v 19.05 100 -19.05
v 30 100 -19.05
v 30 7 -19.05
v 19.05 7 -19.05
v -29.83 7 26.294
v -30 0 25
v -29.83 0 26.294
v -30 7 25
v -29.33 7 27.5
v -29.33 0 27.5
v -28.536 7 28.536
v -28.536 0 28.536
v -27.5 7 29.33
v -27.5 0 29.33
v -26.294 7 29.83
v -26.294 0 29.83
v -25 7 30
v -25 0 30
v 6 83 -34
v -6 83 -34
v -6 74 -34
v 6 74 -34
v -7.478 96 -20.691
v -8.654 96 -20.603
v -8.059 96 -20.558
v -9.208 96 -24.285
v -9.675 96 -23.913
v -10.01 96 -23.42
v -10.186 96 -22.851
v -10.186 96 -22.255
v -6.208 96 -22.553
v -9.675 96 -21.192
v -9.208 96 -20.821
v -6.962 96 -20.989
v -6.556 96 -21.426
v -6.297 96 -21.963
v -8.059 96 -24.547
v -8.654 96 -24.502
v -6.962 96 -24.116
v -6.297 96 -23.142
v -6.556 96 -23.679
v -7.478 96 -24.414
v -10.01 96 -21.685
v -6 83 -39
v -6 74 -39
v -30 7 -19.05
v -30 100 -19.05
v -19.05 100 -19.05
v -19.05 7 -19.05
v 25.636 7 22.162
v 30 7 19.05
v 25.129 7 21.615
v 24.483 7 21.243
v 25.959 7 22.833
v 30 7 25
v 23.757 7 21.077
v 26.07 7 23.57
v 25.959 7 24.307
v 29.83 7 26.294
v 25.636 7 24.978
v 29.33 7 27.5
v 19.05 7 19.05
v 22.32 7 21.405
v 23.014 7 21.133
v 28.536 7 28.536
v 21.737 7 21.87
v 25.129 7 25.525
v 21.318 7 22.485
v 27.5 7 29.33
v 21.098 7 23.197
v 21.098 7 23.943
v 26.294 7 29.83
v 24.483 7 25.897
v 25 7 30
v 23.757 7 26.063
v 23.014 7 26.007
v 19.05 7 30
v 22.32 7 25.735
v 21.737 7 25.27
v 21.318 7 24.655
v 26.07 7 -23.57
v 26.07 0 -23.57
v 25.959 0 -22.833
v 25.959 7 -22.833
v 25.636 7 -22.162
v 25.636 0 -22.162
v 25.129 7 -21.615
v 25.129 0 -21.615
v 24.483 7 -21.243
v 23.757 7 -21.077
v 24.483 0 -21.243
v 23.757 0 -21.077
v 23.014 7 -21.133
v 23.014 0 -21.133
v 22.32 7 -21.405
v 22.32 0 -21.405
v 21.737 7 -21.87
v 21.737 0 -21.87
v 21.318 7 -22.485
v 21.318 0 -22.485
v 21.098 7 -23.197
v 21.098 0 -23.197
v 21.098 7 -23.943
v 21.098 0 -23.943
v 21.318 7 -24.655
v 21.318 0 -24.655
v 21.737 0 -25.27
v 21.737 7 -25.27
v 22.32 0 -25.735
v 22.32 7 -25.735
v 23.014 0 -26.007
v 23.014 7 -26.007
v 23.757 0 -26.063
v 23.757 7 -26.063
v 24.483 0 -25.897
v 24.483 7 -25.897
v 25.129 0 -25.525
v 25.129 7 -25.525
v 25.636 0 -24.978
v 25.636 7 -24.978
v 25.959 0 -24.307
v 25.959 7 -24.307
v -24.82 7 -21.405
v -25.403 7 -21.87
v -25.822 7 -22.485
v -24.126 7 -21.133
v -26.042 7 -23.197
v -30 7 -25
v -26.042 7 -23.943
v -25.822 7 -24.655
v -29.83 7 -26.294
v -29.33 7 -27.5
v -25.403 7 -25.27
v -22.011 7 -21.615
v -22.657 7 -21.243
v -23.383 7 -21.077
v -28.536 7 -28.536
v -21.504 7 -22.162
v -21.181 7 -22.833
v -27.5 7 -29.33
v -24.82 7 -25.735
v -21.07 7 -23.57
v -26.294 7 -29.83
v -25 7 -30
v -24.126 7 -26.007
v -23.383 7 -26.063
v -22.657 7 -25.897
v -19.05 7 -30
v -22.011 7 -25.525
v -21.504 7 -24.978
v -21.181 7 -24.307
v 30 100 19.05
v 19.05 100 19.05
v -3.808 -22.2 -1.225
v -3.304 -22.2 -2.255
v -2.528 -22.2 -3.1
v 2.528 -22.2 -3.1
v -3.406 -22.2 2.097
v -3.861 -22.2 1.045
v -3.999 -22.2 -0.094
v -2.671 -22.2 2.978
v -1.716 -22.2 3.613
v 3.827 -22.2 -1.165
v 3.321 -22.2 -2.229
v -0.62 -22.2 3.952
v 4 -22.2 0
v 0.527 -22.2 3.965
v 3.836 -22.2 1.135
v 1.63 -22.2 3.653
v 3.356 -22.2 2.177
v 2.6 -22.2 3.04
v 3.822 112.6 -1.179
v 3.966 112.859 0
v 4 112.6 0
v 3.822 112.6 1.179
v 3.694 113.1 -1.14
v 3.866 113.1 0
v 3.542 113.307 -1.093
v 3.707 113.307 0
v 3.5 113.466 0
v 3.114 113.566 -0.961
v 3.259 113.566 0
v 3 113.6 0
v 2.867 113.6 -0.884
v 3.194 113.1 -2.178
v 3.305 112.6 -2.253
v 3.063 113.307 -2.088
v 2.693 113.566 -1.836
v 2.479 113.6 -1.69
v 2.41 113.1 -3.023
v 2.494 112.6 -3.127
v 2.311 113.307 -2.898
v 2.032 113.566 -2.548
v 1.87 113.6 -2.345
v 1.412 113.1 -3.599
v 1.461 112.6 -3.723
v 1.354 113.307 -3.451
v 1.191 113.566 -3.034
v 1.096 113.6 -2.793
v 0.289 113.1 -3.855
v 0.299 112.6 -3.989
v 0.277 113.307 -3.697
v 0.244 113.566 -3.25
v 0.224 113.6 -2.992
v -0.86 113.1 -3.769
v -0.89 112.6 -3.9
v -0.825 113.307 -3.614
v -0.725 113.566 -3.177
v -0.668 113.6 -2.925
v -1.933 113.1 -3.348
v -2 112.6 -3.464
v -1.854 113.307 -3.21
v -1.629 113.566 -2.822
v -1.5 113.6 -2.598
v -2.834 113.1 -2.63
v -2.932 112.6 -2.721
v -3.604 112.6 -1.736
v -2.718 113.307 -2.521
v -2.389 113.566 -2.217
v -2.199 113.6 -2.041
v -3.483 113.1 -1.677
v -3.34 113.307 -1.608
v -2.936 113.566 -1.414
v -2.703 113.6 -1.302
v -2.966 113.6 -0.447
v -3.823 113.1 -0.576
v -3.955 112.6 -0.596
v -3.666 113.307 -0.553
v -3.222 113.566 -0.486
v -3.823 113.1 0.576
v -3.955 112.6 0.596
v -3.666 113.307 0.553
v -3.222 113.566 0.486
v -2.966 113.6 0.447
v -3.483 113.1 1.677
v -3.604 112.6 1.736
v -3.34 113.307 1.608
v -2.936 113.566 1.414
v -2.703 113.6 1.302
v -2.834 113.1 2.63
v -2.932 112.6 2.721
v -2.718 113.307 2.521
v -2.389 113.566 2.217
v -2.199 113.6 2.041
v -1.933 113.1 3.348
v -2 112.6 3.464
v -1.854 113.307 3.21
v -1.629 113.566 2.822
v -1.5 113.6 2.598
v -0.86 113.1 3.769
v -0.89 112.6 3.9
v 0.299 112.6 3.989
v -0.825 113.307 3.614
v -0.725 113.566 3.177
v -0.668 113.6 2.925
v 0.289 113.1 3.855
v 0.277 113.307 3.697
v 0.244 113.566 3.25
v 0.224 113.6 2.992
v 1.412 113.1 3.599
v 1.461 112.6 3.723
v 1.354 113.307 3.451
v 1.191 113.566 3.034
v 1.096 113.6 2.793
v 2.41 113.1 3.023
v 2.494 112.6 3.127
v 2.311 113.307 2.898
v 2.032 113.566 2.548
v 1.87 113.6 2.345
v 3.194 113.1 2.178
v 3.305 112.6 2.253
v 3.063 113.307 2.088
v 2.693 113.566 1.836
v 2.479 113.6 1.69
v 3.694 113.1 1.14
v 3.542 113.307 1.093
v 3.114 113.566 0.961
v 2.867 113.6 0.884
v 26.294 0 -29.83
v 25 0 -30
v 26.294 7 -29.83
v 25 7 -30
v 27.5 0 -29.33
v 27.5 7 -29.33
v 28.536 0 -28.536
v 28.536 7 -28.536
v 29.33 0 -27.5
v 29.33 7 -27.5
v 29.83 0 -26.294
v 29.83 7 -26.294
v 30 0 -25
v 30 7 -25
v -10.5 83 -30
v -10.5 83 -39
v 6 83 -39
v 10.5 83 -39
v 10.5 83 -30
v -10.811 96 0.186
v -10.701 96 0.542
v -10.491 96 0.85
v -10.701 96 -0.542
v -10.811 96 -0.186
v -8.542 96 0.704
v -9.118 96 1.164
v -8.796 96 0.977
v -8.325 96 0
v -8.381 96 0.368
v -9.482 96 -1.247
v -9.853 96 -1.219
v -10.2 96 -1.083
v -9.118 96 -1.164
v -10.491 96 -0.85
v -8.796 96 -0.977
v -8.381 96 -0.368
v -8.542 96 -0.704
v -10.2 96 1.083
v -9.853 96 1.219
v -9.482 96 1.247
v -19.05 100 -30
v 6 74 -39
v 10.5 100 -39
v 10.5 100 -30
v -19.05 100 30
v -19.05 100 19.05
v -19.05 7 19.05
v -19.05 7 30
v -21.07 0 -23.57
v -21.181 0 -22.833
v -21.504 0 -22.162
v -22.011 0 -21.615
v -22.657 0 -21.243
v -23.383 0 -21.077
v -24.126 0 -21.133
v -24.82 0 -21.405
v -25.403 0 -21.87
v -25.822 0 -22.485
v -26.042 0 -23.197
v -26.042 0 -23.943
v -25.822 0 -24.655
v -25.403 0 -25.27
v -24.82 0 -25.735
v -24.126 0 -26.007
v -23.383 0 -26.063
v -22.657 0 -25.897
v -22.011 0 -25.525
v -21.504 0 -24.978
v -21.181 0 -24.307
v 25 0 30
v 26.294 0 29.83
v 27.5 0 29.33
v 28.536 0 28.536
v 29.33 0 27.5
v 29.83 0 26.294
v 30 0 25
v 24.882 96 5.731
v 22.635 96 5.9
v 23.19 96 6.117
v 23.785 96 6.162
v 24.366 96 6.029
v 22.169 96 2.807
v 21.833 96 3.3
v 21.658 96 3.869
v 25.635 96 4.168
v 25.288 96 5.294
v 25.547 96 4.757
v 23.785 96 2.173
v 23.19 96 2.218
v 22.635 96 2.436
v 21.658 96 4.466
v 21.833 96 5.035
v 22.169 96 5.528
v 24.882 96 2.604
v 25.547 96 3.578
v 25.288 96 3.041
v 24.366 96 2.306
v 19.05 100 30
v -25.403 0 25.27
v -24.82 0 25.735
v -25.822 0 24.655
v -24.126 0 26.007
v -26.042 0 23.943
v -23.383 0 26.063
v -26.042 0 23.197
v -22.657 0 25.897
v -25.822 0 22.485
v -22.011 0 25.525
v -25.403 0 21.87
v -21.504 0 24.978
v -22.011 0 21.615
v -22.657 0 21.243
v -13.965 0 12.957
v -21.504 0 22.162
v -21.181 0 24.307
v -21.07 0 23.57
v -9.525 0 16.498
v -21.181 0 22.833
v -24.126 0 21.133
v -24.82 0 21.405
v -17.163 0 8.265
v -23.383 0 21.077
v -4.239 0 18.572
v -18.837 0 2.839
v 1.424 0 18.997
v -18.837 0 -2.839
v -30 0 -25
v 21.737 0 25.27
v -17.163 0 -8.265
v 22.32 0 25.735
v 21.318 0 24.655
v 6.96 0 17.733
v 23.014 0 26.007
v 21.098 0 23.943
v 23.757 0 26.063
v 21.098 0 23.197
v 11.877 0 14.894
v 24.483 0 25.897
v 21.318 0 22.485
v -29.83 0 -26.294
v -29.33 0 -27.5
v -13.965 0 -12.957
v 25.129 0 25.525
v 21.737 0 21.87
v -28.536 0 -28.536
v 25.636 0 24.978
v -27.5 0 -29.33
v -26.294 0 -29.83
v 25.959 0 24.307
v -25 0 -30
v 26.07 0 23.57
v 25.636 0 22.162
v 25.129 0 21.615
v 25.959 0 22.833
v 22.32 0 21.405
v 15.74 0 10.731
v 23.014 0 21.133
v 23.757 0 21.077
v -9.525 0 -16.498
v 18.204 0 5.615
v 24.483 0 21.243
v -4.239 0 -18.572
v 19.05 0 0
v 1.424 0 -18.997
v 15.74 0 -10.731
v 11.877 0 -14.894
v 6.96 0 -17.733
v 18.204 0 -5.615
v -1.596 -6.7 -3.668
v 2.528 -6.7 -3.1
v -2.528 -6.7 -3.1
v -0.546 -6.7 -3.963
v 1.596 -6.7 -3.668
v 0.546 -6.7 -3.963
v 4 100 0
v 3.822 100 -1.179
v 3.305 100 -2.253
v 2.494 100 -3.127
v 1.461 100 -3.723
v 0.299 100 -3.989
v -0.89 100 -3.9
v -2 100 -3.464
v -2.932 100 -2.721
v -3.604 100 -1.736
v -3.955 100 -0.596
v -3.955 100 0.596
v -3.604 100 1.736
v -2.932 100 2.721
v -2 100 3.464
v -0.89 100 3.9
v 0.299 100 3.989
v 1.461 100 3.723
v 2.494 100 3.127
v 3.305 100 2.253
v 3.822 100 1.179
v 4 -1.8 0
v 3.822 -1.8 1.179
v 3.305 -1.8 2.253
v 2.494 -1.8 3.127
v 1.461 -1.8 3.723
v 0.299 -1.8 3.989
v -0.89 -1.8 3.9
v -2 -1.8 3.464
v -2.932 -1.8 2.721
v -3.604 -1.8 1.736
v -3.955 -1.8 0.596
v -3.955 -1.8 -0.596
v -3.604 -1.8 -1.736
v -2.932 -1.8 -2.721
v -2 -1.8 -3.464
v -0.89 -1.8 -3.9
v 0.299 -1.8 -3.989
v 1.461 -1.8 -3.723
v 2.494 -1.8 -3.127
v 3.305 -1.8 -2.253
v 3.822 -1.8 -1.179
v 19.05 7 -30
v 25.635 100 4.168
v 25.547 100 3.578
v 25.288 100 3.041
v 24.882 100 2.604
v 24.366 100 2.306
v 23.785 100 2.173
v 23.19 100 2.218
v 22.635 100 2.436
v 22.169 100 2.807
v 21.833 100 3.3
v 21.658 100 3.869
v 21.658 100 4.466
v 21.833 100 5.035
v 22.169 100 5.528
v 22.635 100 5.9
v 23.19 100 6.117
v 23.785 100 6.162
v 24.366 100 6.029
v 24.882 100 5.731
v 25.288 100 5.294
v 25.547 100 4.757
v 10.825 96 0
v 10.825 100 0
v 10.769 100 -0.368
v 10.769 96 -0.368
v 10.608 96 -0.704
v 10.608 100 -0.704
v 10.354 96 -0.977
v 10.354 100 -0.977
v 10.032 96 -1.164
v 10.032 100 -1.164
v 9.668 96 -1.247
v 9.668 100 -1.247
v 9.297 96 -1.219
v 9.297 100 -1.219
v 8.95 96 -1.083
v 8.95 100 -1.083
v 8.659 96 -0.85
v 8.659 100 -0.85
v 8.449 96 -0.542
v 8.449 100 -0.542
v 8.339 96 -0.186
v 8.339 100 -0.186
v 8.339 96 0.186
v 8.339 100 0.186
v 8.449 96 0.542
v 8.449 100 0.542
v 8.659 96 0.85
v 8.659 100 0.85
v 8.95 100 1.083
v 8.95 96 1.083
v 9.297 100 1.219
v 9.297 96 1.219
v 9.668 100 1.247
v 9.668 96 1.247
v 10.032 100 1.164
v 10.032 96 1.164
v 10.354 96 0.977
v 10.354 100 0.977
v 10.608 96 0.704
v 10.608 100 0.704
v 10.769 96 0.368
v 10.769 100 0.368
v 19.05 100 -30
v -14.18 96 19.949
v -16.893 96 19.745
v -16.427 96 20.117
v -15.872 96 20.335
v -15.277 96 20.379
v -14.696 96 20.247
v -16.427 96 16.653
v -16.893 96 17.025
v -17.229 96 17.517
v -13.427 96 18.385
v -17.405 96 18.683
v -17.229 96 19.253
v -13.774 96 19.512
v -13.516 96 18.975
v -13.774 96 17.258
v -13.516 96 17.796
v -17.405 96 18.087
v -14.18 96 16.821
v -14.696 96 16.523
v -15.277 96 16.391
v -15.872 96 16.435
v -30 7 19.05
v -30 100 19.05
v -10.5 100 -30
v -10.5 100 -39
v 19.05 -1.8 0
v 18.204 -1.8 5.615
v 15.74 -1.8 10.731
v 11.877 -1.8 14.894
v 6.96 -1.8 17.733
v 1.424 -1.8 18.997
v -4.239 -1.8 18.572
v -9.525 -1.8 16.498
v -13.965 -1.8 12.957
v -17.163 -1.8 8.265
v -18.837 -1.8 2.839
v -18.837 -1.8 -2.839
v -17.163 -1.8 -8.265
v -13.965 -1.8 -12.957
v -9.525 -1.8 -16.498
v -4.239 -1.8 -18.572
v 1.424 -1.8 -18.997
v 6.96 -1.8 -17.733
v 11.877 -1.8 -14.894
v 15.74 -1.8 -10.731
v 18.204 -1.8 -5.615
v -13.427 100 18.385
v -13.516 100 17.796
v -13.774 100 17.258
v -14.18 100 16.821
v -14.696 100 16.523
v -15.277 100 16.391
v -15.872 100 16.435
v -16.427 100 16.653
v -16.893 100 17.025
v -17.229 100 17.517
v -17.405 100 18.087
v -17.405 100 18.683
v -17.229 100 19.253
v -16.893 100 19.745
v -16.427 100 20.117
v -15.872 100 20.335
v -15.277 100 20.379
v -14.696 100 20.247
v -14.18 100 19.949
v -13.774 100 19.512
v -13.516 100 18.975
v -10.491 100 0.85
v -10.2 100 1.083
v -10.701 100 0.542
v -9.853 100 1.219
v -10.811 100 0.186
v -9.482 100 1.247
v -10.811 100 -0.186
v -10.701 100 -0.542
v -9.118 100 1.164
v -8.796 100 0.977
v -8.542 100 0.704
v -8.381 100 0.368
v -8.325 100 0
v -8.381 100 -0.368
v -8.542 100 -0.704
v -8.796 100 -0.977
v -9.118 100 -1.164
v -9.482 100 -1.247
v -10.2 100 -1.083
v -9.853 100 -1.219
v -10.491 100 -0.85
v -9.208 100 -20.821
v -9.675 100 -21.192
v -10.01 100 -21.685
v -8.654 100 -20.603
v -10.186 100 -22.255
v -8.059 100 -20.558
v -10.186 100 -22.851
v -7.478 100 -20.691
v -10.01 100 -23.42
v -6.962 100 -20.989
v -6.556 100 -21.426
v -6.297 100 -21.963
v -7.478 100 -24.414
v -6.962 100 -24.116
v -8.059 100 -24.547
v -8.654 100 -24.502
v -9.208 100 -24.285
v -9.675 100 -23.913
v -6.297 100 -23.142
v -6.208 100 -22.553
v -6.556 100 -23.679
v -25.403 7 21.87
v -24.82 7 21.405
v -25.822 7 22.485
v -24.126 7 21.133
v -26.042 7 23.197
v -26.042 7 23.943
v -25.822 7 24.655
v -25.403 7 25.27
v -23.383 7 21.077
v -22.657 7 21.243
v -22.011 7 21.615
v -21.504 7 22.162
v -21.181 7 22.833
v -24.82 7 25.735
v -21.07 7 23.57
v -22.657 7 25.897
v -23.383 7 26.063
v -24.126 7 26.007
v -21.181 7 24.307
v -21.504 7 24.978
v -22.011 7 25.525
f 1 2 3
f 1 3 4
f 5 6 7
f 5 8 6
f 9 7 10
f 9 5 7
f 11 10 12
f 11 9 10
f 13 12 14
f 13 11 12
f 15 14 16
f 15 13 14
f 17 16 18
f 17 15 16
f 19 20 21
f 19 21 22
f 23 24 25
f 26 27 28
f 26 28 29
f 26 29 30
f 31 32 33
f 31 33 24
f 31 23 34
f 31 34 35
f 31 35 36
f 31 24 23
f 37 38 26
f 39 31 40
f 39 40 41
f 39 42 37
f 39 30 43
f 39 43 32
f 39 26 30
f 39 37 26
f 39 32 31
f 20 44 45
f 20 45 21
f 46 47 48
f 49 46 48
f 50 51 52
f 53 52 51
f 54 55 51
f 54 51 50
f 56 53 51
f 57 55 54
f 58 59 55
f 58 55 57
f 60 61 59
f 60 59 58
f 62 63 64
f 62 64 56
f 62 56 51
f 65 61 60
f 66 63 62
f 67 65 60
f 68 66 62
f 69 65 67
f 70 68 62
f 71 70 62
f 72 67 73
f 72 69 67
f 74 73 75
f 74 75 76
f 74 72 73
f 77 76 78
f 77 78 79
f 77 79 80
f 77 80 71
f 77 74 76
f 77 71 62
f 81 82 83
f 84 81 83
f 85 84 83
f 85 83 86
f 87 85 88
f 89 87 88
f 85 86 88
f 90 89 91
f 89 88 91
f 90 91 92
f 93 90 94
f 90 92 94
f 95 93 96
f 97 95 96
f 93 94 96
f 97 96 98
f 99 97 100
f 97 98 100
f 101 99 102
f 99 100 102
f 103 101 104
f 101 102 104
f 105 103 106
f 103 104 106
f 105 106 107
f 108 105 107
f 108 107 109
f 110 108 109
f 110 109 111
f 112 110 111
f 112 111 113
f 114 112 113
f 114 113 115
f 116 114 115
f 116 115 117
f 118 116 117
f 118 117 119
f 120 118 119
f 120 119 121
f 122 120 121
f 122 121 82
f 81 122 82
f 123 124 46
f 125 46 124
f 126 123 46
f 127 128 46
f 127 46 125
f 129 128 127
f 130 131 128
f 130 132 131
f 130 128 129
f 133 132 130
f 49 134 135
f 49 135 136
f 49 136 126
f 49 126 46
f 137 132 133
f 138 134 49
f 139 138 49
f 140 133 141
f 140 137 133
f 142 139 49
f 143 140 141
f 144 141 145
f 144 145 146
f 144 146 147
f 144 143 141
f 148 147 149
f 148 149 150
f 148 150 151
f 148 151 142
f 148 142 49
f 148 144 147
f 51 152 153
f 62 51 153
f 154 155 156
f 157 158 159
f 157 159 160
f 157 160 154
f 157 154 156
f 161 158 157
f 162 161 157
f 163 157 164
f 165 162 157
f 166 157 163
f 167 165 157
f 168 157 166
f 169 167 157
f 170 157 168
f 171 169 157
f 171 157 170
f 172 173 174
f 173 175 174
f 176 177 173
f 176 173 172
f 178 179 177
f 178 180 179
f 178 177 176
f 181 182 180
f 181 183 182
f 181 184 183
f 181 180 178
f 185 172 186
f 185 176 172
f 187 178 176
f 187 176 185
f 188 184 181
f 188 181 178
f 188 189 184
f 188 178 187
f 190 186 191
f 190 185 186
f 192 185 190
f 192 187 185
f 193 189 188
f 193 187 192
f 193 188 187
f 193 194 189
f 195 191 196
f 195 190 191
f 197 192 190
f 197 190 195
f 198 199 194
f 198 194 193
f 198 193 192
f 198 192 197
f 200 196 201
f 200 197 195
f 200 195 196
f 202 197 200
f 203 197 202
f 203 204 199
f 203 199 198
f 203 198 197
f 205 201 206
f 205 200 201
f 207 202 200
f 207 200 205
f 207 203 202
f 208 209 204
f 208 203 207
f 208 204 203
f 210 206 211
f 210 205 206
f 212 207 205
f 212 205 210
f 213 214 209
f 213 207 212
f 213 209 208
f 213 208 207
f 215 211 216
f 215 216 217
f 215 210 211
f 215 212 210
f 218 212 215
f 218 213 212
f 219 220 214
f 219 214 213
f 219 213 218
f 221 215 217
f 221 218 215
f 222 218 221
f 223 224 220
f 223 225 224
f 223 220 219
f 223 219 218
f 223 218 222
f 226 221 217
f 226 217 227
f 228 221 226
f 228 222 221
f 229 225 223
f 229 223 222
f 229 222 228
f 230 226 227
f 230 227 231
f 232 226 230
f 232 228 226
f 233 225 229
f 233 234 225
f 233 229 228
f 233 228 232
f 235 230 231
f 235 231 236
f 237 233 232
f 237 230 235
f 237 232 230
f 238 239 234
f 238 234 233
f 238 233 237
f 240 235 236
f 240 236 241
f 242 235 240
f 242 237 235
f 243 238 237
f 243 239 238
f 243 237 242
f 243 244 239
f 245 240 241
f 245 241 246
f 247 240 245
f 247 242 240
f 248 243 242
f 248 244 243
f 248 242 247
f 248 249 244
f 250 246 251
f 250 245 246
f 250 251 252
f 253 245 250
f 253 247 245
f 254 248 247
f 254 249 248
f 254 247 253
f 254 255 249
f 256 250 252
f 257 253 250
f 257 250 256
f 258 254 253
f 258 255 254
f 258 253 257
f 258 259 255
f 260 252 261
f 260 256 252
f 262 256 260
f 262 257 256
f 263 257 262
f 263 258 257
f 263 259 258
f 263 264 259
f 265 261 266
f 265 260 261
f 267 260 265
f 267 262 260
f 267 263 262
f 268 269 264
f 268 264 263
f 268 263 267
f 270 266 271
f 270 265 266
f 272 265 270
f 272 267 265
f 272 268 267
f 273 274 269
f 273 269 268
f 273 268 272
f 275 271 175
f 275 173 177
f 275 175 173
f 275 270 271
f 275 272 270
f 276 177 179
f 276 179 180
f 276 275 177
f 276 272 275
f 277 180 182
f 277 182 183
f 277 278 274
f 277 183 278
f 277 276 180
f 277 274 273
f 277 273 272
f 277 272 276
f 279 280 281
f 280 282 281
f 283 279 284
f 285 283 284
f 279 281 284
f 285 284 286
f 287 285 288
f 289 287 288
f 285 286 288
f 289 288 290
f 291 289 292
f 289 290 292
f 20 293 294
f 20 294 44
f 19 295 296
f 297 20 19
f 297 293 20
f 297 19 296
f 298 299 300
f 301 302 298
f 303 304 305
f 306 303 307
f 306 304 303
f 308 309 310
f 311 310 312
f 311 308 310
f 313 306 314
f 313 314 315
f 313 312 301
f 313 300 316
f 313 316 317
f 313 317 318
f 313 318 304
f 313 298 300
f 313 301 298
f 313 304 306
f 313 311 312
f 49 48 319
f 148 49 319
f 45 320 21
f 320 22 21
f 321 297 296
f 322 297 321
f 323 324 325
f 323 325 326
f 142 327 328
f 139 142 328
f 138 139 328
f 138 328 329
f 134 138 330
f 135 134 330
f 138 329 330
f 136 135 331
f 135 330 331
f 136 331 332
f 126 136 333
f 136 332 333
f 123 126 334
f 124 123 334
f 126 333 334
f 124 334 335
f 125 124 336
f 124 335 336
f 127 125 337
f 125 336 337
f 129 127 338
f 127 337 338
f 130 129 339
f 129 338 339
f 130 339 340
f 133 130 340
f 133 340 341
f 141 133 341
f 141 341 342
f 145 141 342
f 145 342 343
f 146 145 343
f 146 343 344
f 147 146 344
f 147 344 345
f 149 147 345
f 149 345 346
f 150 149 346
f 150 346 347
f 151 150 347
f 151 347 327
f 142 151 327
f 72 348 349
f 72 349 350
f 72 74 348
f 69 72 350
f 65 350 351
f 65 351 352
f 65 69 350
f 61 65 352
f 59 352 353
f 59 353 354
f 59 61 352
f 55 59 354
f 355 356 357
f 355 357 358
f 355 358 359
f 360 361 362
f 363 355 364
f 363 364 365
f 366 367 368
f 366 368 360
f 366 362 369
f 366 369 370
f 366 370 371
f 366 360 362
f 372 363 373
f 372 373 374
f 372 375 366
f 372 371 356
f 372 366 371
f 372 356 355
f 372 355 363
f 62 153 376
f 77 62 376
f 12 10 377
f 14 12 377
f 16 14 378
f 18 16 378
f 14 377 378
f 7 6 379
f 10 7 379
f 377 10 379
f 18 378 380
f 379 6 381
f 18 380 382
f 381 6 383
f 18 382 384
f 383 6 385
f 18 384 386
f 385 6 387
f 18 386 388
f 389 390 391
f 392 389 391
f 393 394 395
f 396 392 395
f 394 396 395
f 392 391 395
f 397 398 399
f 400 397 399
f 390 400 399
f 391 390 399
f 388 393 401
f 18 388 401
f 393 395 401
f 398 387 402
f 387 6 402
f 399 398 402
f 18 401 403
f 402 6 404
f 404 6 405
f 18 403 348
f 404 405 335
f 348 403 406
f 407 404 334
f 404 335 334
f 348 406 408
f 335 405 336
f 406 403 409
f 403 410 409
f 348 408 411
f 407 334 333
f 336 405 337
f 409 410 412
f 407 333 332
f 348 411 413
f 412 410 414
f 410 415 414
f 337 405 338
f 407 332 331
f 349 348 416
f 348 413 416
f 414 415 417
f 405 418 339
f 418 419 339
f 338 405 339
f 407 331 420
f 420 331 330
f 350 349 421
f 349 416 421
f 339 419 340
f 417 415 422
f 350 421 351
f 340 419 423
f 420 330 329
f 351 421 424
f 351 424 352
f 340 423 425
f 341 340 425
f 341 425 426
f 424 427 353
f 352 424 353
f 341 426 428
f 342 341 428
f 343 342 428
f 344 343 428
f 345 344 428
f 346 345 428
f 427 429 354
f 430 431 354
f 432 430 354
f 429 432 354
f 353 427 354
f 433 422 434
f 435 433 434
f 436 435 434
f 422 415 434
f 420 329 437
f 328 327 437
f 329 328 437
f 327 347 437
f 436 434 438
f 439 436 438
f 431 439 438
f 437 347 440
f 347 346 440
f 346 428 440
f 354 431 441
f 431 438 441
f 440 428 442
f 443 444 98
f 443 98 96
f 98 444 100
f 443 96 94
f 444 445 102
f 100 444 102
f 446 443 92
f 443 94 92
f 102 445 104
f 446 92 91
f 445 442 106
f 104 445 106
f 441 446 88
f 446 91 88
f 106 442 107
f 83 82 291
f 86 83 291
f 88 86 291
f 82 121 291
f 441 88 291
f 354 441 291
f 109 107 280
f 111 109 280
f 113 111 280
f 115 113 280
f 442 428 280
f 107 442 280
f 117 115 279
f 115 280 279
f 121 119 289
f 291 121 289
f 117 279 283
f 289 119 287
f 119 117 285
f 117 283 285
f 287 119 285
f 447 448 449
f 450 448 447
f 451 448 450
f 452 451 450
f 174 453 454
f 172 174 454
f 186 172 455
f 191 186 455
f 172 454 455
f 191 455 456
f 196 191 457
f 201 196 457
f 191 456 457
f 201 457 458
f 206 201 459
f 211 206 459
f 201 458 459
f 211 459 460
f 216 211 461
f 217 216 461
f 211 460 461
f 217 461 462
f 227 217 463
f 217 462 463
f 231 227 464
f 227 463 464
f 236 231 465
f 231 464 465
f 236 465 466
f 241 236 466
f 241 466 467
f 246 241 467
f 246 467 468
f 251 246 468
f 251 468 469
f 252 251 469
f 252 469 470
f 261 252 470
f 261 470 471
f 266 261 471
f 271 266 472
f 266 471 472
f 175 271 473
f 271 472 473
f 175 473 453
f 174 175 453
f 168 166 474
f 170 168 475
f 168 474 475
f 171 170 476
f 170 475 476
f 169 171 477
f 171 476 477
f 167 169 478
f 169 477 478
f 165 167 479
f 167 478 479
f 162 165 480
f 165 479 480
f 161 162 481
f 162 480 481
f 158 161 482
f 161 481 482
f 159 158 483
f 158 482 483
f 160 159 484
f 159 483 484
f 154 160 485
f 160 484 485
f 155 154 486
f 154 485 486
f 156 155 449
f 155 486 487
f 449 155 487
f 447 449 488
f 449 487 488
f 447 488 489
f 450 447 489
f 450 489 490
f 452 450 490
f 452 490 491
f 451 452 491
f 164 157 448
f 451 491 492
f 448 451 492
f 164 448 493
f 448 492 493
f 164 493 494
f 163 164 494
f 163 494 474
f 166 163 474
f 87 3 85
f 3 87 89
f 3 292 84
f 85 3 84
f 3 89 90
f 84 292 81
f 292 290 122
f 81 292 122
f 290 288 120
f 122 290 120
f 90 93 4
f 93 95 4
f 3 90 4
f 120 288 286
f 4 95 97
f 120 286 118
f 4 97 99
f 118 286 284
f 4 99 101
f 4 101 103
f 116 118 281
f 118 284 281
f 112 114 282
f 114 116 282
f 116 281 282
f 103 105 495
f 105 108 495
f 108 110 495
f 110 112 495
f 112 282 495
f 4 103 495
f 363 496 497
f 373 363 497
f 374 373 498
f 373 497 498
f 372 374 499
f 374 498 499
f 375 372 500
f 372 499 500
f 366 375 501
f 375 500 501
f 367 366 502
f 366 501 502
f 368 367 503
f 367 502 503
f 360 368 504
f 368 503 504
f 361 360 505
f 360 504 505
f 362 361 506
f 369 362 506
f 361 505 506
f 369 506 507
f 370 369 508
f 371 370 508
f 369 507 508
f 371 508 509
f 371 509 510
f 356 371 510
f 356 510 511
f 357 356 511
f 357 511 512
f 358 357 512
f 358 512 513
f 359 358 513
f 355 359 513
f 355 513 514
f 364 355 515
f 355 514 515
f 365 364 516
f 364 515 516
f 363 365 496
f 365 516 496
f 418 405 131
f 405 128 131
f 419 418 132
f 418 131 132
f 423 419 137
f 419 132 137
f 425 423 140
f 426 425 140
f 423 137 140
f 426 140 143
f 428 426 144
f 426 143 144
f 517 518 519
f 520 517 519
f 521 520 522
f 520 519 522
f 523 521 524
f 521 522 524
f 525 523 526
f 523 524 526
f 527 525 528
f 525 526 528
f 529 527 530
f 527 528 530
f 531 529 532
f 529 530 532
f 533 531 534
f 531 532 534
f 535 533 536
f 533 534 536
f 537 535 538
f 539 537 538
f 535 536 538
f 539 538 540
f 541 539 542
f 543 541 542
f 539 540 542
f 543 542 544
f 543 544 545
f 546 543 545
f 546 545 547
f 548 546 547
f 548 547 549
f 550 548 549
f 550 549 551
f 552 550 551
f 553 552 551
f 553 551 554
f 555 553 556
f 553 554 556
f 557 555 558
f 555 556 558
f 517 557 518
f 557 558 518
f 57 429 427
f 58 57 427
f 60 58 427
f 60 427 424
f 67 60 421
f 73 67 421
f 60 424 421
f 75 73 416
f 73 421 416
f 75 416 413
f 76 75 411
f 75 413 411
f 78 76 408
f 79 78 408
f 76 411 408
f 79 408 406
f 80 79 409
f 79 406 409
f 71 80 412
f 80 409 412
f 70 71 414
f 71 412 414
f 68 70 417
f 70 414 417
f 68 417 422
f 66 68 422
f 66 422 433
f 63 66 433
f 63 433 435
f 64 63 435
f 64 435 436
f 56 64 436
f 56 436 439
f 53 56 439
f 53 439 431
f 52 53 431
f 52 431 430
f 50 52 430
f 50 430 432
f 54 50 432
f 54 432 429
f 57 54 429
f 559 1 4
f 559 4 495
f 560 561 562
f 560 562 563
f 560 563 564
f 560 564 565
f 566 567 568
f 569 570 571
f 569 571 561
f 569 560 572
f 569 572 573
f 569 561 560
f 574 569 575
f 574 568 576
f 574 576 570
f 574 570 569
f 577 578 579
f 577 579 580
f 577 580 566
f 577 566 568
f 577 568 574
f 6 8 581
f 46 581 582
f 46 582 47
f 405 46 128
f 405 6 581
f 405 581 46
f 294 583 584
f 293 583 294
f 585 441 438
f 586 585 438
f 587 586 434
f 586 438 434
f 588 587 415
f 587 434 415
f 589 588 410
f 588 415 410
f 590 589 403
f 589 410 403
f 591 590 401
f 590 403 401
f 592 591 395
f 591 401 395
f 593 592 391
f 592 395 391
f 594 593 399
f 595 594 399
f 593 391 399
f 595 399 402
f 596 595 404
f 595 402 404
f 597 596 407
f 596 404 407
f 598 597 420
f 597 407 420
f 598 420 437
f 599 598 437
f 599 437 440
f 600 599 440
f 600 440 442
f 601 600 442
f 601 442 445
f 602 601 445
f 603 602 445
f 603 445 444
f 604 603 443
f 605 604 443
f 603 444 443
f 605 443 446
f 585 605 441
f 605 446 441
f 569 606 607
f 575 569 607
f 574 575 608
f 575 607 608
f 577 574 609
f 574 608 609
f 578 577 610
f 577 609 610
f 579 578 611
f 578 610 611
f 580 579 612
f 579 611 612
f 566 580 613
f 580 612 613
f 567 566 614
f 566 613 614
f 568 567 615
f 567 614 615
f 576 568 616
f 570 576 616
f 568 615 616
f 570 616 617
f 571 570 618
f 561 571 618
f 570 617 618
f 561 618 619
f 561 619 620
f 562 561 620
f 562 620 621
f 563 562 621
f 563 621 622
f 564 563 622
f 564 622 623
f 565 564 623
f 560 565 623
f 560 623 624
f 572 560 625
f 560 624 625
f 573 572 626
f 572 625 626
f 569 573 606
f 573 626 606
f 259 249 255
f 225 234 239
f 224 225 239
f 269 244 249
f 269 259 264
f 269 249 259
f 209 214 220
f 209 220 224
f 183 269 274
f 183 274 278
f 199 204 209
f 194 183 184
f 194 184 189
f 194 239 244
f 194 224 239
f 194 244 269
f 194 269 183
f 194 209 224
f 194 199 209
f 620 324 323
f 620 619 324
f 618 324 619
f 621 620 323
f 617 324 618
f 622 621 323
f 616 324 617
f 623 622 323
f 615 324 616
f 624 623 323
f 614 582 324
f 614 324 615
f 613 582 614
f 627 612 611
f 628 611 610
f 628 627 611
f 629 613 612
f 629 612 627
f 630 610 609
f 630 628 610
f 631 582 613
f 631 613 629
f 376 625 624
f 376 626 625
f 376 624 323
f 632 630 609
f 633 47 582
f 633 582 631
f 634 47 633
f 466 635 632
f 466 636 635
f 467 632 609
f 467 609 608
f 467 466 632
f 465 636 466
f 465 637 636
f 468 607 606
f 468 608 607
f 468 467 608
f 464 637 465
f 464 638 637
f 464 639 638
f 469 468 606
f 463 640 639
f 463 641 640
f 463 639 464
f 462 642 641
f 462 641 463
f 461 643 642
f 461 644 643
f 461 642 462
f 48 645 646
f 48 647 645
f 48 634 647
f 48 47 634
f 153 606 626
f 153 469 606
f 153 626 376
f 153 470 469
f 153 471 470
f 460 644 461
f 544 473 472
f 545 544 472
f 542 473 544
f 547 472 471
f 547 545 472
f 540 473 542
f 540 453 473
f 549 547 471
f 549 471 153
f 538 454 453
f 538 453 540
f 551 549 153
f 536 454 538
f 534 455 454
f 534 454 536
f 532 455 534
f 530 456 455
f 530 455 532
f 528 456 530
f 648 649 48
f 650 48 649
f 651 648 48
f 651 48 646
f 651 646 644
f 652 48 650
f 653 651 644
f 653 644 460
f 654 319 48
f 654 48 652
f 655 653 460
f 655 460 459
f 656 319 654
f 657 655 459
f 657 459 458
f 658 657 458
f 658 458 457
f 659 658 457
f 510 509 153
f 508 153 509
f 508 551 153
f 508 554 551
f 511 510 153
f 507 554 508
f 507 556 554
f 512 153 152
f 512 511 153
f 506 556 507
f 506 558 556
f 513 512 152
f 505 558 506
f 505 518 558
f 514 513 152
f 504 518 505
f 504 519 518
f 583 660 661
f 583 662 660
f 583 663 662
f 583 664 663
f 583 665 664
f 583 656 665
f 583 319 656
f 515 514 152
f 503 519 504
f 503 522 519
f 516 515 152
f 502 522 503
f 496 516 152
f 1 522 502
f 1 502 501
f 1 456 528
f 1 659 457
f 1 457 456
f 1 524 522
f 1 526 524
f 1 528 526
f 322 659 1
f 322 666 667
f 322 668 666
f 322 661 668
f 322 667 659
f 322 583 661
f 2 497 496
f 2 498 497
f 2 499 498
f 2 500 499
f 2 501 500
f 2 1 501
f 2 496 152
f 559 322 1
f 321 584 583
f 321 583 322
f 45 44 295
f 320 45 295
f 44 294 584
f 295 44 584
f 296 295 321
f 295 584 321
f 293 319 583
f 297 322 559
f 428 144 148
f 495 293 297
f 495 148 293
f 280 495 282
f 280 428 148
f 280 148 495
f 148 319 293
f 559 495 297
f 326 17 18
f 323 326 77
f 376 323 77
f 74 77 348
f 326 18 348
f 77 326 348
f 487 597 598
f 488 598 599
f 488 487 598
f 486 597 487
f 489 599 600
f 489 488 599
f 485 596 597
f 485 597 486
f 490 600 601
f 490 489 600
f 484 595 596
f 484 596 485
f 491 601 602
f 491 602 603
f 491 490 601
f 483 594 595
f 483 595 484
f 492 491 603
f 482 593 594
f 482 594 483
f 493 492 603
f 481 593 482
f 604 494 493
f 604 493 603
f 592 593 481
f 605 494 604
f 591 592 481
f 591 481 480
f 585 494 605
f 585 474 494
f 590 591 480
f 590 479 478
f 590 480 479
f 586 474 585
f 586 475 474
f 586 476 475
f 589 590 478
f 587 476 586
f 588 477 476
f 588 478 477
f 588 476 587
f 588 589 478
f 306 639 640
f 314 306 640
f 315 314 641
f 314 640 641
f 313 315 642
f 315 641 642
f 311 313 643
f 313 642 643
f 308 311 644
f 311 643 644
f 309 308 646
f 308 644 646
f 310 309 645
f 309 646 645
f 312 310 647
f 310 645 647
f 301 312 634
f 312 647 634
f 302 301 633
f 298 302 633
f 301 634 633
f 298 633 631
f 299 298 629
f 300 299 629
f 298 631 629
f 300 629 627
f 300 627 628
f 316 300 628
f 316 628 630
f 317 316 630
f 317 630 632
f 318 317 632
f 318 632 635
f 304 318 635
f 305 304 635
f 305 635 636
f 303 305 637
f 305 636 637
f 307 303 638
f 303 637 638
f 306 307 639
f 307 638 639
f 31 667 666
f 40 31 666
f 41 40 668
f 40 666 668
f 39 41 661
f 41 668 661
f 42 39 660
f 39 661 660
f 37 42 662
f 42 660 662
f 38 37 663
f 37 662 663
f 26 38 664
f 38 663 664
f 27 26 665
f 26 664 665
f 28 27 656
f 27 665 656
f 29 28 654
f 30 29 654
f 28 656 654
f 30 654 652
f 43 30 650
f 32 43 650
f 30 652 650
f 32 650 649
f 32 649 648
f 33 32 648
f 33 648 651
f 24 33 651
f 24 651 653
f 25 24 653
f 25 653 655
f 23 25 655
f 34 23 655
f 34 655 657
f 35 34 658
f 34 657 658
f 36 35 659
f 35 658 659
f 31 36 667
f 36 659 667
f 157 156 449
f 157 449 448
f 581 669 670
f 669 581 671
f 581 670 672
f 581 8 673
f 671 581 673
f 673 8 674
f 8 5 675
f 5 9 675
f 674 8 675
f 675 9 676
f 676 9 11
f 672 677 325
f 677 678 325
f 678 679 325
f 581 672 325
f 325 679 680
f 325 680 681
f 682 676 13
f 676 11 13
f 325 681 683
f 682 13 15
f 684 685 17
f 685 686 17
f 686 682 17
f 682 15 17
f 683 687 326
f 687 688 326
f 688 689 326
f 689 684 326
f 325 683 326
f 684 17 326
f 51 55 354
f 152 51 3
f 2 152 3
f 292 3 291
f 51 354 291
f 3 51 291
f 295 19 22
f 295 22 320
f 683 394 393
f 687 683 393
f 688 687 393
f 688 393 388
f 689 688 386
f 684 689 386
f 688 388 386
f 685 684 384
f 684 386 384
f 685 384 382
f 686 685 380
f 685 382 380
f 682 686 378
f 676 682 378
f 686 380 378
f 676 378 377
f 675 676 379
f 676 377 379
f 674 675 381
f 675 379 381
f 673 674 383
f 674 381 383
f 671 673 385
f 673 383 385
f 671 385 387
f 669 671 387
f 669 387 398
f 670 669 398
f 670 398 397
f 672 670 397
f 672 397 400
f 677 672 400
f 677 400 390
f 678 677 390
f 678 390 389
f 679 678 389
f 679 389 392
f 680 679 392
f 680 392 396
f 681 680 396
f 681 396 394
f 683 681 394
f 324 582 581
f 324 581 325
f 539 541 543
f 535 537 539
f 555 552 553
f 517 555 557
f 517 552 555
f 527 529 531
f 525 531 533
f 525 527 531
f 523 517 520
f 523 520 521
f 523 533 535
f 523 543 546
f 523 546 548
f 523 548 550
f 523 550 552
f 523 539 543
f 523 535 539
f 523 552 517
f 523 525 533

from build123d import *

# Parameters (mm, degrees)
SKETCH1_W               = 60
SKETCH1_H               = 60
BOSS_EXTRUDE1_DEPTH     = 100
SKETCH2_W               = 10.95
SKETCH2_H               = 10.95
CUT_EXTRUDE1_DEPTH      = 93
MIRROR2_COPY_1_SKETCH_W = 10.95
MIRROR2_COPY_1_SKETCH_H = 10.95
MIRROR2_COPY_1_DEPTH    = 93
SKETCH5_R               = 2.5
CUT_EXTRUDE2_DEPTH      = 93
SKETCH7_R               = 19.05
BOSS_EXTRUDE4_DEPTH     = 1.8
SKETCH8_R               = 4
BOSS_EXTRUDE5_DEPTH     = 20.4
FILLET2_R               = 5
SKETCH15_R              = 4
BOSS_EXTRUDE6_DEPTH     = 13.6
FILLET4_R               = 1
CUT_EXTRUDE4_DEPTH      = 15.5
BOSS_EXTRUDE7_DEPTH     = 9
BOSS_EXTRUDE8_DEPTH     = 9
SKETCH22_R              = 1.25
SKETCH22_R_2            = 2
CUT_EXTRUDE7_DEPTH      = 4


with BuildPart() as part:
    # Sketch1 → Boss-Extrude1 (new body)
    with BuildSketch(Plane(origin=(0, 0, 0), x_dir=(1, 0, 0), z_dir=(0, 1, 0))):
        Rectangle(SKETCH1_W, SKETCH1_H)
    extrude(amount=BOSS_EXTRUDE1_DEPTH)

    # Sketch2 → Cut-Extrude1 (cut)
    with BuildSketch(Plane(origin=(0, 100, 0), x_dir=(1, 0, 0), z_dir=(0, 1, 0))):
        with Locations((-24.525, 24.525)):
            Rectangle(SKETCH2_W, SKETCH2_H)
    cut_extrude1 = extrude(amount=-CUT_EXTRUDE1_DEPTH, mode=Mode.SUBTRACT)

    # Mirror1: Cut-Extrude1 across plane
    add(cut_extrude1.mirror(Plane(origin=(0, 0, 0), x_dir=(0, 0, 1), z_dir=(1, 0, 0))), mode=Mode.SUBTRACT)

    # Mirror2: Cut-Extrude1 across plane
    add(cut_extrude1.mirror(Plane.XY), mode=Mode.SUBTRACT)

    # Mirror2 copy 1 sketch → Mirror2 copy 1 (cut)
    with BuildSketch(Plane(origin=(0, 100, 0), x_dir=(-1, 0, 0), z_dir=(0, 1, 0))):
        with Locations((-24.525, 24.525)):
            Rectangle(MIRROR2_COPY_1_SKETCH_W, MIRROR2_COPY_1_SKETCH_H)
    extrude(amount=-MIRROR2_COPY_1_DEPTH, mode=Mode.SUBTRACT)

    # Sketch5 → Cut-Extrude2 (cut)
    with BuildSketch(Plane.XZ):
        with Locations((-23.57, -23.57)):
            Circle(SKETCH5_R)
        with Locations((23.57, -23.57)):
            Circle(SKETCH5_R)
        with Locations((23.57, 23.57)):
            Circle(SKETCH5_R)
        with Locations((-23.57, 23.57)):
            Circle(SKETCH5_R)
    extrude(amount=-CUT_EXTRUDE2_DEPTH, mode=Mode.SUBTRACT)

    # Sketch7 → Boss-Extrude4 (add)
    with BuildSketch(Plane.XZ):
        Circle(SKETCH7_R)
    extrude(amount=BOSS_EXTRUDE4_DEPTH)

    # Sketch8 → Boss-Extrude5 (add)
    with BuildSketch(Plane.XZ.offset(1.8)):
        Circle(SKETCH8_R)
    extrude(amount=BOSS_EXTRUDE5_DEPTH)

    # Fillet2
    fillet2_edges = [part.edges().sort_by_distance(p)[0] for p in [
        (-30, 3.5, -30),
        (30, 3.5, -30),
        (30, 3.5, 30),
        (-30, 3.5, 30),
    ]]
    fillet(fillet2_edges, radius=FILLET2_R)

    # Sketch15 → Boss-Extrude6 (add)
    with BuildSketch(Plane(origin=(0, 100, 0), x_dir=(1, 0, 0), z_dir=(0, 1, 0))):
        Circle(SKETCH15_R)
    extrude(amount=BOSS_EXTRUDE6_DEPTH)

    # Fillet4
    fillet4_edges = [part.edges().sort_by_distance(p)[0] for p in [
        (-4, 113.6, 0),
    ]]
    fillet(fillet4_edges, radius=FILLET4_R)

    # Sketch17 → Cut-Extrude4 (cut)
    with BuildSketch(Plane.XZ.offset(22.2)):
        with BuildLine():
            Line((-2.552821159, -3.1), (2.552821159, -3.1))
            ThreePointArc((2.552821159, -3.1), (0, -4.015830658), (-2.552821159, -3.1))
        make_face()
    extrude(amount=-CUT_EXTRUDE4_DEPTH, mode=Mode.SUBTRACT)

    # Sketch20 → Boss-Extrude7 (add)
    with BuildSketch(Plane(origin=(0, 0, -30), x_dir=(-1, 0, 0), z_dir=(0, 0, -1))):
        Polygon((0, 100), (10.5, 100), (10.5, 83), (-10.5, 83), (-10.5, 100), align=None)
    extrude(amount=BOSS_EXTRUDE7_DEPTH)

    # Sketch21 → Boss-Extrude8 (add)
    with BuildSketch(Plane.XZ.offset(-83)):
        Polygon((0, -39), (-6, -39), (-6, -34), (6, -34), (6, -39), align=None)
    extrude(amount=BOSS_EXTRUDE8_DEPTH)

    # Sketch22 → Cut-Extrude7 (cut)
    with BuildSketch(Plane(origin=(0, 100, 0), x_dir=(1, 0, 0), z_dir=(0, 1, 0))):
        with Locations((-9.575, 0)):
            Circle(SKETCH22_R)
        with Locations((9.575, 0)):
            Circle(SKETCH22_R)
        with Locations((-8.20848344, 22.552622899)):
            Circle(SKETCH22_R_2)
        with Locations((-15.426902632, -18.385066635)):
            Circle(SKETCH22_R_2)
        with Locations((23.635386072, -4.167556264)):
            Circle(SKETCH22_R_2)
    extrude(amount=-CUT_EXTRUDE7_DEPTH, mode=Mode.SUBTRACT)


solid = part.part
